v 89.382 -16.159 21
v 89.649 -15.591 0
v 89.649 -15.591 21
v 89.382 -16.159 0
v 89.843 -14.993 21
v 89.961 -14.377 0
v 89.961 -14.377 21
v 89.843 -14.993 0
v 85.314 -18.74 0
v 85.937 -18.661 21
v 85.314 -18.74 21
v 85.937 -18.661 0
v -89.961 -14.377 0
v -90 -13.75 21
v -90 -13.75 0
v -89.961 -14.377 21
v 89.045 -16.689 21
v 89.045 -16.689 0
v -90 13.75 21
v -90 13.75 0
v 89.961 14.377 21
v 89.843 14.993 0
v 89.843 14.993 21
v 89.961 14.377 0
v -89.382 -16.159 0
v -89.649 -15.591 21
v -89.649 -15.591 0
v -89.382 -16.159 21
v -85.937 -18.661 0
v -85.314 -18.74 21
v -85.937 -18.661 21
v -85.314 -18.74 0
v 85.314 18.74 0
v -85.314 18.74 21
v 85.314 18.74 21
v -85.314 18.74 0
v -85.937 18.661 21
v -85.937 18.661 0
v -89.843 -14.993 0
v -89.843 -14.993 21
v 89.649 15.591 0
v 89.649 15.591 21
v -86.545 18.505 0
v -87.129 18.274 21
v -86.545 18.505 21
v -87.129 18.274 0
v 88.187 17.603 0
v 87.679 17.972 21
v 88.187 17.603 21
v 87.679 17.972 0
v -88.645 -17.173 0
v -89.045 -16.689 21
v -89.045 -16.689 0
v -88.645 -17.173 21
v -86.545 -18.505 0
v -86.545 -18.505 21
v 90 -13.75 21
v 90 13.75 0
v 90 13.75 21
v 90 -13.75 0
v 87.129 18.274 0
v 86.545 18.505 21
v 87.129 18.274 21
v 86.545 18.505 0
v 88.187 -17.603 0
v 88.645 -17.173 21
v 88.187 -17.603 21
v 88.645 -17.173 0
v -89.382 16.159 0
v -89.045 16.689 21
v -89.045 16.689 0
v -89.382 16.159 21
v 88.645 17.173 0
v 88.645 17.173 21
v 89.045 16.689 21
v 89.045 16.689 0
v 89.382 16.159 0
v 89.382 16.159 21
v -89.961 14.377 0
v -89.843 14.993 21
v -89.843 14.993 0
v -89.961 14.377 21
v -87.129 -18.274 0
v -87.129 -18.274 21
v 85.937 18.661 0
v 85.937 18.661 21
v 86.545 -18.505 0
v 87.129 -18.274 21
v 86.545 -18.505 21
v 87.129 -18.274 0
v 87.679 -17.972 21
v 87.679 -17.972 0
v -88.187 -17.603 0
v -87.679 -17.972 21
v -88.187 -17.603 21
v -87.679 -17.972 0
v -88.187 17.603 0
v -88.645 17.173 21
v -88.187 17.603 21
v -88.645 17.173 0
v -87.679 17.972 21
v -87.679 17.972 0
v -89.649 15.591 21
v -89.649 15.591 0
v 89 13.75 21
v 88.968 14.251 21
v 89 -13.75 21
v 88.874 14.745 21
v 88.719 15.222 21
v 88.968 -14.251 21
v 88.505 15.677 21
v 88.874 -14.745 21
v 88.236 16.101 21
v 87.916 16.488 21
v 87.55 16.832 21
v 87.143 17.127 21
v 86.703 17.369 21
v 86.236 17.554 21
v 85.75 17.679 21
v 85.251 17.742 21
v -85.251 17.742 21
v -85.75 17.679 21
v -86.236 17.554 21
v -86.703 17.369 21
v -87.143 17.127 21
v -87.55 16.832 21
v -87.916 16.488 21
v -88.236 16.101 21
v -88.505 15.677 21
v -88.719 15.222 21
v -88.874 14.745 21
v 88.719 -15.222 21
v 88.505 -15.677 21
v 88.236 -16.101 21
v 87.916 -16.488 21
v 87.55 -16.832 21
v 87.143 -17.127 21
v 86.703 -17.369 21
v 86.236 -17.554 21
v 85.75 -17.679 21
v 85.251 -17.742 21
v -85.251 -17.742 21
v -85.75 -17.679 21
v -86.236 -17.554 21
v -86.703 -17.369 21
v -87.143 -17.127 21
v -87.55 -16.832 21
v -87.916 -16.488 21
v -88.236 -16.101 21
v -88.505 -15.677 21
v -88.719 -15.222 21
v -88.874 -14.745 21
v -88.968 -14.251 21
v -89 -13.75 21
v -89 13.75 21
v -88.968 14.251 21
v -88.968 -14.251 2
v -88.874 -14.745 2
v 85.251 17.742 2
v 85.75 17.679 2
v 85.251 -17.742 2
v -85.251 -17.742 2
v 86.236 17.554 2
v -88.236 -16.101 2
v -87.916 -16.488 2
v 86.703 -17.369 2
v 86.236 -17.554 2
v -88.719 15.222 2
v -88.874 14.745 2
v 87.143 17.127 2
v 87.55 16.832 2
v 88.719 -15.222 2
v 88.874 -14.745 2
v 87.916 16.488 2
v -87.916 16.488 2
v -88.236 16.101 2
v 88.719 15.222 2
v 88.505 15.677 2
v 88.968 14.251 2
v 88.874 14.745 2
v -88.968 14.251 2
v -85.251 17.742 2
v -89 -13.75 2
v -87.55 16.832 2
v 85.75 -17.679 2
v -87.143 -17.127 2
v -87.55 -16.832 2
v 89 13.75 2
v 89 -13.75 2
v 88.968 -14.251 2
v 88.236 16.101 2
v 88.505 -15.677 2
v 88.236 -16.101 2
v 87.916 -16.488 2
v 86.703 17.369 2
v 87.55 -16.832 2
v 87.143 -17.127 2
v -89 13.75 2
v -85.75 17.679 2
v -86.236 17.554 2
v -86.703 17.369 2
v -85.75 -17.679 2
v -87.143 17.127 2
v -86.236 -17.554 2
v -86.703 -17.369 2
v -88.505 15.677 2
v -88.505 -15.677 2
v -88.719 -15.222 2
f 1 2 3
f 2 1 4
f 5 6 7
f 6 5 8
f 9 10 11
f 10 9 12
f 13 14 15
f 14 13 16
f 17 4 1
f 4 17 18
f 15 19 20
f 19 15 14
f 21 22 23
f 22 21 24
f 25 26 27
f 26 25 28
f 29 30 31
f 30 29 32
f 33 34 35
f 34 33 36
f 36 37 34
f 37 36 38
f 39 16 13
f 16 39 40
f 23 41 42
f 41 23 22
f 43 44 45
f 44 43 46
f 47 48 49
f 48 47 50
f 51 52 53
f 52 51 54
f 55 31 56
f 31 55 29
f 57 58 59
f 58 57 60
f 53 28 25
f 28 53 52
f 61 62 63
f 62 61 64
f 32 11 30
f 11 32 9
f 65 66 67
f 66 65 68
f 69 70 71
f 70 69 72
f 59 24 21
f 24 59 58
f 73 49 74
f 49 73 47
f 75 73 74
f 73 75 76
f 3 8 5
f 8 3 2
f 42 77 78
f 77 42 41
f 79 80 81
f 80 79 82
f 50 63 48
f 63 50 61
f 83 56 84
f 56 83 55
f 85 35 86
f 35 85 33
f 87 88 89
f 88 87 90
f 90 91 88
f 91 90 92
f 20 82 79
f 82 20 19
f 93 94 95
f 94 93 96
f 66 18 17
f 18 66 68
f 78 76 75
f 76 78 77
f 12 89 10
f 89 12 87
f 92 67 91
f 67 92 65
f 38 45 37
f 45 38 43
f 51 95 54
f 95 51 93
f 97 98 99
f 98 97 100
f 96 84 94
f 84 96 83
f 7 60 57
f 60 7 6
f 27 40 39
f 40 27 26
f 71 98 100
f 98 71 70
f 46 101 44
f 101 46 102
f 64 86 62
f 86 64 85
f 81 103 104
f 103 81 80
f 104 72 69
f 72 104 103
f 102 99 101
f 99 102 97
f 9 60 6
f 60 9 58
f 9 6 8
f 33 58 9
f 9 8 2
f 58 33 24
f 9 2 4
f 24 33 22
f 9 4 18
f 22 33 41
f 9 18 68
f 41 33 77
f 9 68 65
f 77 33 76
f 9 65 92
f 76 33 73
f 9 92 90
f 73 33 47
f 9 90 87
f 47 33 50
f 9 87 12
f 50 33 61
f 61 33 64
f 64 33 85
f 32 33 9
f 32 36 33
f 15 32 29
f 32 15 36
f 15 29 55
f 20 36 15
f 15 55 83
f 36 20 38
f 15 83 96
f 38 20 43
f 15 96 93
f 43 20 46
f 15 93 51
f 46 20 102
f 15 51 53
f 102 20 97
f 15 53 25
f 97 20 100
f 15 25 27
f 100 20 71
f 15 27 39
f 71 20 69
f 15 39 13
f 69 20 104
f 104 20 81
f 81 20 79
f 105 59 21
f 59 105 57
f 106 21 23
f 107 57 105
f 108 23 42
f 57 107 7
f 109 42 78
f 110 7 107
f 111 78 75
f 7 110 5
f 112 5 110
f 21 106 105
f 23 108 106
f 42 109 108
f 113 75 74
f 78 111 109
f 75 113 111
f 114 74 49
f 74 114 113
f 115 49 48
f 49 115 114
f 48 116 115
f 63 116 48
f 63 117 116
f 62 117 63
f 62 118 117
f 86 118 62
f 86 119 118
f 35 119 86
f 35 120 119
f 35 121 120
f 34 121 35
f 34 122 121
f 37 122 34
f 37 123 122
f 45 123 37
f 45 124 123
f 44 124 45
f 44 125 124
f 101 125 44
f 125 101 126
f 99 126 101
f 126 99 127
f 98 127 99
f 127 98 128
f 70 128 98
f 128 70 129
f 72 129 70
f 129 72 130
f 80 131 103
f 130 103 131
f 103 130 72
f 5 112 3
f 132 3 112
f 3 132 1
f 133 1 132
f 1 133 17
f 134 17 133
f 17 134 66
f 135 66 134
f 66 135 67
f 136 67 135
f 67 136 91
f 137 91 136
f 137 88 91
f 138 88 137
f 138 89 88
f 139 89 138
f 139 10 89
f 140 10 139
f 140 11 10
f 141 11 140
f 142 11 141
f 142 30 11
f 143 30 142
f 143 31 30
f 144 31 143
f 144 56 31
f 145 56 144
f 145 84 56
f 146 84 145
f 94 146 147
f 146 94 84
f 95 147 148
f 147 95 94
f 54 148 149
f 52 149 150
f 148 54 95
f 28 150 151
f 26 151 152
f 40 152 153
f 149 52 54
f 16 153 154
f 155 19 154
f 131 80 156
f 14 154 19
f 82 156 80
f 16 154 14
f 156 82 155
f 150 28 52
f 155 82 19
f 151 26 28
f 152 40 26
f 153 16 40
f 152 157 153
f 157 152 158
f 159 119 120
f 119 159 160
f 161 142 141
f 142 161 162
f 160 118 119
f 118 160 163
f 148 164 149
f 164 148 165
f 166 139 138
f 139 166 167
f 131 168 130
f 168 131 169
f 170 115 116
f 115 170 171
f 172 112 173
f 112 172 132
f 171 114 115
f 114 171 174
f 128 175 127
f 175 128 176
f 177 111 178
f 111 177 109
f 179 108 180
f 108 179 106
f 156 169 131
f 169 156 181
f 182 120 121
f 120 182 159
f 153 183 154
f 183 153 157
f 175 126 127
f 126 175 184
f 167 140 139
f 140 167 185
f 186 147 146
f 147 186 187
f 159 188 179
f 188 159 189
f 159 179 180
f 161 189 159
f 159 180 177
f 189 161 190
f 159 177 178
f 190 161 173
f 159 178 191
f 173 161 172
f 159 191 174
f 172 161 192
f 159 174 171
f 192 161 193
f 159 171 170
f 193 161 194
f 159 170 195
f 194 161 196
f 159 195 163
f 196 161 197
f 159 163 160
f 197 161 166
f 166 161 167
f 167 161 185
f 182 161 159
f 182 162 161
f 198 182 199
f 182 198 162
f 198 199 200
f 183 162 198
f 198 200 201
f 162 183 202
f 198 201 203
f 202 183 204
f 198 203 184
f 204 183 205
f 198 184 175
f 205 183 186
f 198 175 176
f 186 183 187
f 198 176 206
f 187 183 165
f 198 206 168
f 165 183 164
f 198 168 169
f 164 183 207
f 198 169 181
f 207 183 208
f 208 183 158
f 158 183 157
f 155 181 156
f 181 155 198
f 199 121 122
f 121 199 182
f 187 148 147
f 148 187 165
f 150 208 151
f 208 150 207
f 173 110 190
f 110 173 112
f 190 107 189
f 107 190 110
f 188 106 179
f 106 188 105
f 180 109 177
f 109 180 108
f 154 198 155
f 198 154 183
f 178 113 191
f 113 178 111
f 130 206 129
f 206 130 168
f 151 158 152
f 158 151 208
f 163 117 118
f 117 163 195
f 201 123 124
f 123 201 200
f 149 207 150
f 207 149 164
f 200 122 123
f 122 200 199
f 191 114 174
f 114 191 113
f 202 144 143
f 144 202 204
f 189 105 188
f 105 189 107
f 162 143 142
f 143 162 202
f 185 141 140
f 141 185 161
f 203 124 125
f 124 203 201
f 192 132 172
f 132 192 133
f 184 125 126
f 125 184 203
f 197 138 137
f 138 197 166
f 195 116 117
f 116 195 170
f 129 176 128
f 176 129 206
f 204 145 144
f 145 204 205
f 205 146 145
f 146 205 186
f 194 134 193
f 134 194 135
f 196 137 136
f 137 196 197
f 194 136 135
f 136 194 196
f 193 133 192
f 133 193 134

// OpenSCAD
$fn = 50;


difference() {
	union() {
		hull() {
			translate(v = [-85.0000000000, 13.7500000000, 0]) {
				cylinder(h = 21, r = 5);
			}
			translate(v = [85.0000000000, 13.7500000000, 0]) {
				cylinder(h = 21, r = 5);
			}
			translate(v = [-85.0000000000, -13.7500000000, 0]) {
				cylinder(h = 21, r = 5);
			}
			translate(v = [85.0000000000, -13.7500000000, 0]) {
				cylinder(h = 21, r = 5);
			}
		}
	}
	union() {
		translate(v = [0, 0, 2]) {
			hull() {
				translate(v = [-85.0000000000, 13.7500000000, 0]) {
					cylinder(h = 19, r = 4);
				}
				translate(v = [85.0000000000, 13.7500000000, 0]) {
					cylinder(h = 19, r = 4);
				}
				translate(v = [-85.0000000000, -13.7500000000, 0]) {
					cylinder(h = 19, r = 4);
				}
				translate(v = [85.0000000000, -13.7500000000, 0]) {
					cylinder(h = 19, r = 4);
				}
			}
		}
	}
}
